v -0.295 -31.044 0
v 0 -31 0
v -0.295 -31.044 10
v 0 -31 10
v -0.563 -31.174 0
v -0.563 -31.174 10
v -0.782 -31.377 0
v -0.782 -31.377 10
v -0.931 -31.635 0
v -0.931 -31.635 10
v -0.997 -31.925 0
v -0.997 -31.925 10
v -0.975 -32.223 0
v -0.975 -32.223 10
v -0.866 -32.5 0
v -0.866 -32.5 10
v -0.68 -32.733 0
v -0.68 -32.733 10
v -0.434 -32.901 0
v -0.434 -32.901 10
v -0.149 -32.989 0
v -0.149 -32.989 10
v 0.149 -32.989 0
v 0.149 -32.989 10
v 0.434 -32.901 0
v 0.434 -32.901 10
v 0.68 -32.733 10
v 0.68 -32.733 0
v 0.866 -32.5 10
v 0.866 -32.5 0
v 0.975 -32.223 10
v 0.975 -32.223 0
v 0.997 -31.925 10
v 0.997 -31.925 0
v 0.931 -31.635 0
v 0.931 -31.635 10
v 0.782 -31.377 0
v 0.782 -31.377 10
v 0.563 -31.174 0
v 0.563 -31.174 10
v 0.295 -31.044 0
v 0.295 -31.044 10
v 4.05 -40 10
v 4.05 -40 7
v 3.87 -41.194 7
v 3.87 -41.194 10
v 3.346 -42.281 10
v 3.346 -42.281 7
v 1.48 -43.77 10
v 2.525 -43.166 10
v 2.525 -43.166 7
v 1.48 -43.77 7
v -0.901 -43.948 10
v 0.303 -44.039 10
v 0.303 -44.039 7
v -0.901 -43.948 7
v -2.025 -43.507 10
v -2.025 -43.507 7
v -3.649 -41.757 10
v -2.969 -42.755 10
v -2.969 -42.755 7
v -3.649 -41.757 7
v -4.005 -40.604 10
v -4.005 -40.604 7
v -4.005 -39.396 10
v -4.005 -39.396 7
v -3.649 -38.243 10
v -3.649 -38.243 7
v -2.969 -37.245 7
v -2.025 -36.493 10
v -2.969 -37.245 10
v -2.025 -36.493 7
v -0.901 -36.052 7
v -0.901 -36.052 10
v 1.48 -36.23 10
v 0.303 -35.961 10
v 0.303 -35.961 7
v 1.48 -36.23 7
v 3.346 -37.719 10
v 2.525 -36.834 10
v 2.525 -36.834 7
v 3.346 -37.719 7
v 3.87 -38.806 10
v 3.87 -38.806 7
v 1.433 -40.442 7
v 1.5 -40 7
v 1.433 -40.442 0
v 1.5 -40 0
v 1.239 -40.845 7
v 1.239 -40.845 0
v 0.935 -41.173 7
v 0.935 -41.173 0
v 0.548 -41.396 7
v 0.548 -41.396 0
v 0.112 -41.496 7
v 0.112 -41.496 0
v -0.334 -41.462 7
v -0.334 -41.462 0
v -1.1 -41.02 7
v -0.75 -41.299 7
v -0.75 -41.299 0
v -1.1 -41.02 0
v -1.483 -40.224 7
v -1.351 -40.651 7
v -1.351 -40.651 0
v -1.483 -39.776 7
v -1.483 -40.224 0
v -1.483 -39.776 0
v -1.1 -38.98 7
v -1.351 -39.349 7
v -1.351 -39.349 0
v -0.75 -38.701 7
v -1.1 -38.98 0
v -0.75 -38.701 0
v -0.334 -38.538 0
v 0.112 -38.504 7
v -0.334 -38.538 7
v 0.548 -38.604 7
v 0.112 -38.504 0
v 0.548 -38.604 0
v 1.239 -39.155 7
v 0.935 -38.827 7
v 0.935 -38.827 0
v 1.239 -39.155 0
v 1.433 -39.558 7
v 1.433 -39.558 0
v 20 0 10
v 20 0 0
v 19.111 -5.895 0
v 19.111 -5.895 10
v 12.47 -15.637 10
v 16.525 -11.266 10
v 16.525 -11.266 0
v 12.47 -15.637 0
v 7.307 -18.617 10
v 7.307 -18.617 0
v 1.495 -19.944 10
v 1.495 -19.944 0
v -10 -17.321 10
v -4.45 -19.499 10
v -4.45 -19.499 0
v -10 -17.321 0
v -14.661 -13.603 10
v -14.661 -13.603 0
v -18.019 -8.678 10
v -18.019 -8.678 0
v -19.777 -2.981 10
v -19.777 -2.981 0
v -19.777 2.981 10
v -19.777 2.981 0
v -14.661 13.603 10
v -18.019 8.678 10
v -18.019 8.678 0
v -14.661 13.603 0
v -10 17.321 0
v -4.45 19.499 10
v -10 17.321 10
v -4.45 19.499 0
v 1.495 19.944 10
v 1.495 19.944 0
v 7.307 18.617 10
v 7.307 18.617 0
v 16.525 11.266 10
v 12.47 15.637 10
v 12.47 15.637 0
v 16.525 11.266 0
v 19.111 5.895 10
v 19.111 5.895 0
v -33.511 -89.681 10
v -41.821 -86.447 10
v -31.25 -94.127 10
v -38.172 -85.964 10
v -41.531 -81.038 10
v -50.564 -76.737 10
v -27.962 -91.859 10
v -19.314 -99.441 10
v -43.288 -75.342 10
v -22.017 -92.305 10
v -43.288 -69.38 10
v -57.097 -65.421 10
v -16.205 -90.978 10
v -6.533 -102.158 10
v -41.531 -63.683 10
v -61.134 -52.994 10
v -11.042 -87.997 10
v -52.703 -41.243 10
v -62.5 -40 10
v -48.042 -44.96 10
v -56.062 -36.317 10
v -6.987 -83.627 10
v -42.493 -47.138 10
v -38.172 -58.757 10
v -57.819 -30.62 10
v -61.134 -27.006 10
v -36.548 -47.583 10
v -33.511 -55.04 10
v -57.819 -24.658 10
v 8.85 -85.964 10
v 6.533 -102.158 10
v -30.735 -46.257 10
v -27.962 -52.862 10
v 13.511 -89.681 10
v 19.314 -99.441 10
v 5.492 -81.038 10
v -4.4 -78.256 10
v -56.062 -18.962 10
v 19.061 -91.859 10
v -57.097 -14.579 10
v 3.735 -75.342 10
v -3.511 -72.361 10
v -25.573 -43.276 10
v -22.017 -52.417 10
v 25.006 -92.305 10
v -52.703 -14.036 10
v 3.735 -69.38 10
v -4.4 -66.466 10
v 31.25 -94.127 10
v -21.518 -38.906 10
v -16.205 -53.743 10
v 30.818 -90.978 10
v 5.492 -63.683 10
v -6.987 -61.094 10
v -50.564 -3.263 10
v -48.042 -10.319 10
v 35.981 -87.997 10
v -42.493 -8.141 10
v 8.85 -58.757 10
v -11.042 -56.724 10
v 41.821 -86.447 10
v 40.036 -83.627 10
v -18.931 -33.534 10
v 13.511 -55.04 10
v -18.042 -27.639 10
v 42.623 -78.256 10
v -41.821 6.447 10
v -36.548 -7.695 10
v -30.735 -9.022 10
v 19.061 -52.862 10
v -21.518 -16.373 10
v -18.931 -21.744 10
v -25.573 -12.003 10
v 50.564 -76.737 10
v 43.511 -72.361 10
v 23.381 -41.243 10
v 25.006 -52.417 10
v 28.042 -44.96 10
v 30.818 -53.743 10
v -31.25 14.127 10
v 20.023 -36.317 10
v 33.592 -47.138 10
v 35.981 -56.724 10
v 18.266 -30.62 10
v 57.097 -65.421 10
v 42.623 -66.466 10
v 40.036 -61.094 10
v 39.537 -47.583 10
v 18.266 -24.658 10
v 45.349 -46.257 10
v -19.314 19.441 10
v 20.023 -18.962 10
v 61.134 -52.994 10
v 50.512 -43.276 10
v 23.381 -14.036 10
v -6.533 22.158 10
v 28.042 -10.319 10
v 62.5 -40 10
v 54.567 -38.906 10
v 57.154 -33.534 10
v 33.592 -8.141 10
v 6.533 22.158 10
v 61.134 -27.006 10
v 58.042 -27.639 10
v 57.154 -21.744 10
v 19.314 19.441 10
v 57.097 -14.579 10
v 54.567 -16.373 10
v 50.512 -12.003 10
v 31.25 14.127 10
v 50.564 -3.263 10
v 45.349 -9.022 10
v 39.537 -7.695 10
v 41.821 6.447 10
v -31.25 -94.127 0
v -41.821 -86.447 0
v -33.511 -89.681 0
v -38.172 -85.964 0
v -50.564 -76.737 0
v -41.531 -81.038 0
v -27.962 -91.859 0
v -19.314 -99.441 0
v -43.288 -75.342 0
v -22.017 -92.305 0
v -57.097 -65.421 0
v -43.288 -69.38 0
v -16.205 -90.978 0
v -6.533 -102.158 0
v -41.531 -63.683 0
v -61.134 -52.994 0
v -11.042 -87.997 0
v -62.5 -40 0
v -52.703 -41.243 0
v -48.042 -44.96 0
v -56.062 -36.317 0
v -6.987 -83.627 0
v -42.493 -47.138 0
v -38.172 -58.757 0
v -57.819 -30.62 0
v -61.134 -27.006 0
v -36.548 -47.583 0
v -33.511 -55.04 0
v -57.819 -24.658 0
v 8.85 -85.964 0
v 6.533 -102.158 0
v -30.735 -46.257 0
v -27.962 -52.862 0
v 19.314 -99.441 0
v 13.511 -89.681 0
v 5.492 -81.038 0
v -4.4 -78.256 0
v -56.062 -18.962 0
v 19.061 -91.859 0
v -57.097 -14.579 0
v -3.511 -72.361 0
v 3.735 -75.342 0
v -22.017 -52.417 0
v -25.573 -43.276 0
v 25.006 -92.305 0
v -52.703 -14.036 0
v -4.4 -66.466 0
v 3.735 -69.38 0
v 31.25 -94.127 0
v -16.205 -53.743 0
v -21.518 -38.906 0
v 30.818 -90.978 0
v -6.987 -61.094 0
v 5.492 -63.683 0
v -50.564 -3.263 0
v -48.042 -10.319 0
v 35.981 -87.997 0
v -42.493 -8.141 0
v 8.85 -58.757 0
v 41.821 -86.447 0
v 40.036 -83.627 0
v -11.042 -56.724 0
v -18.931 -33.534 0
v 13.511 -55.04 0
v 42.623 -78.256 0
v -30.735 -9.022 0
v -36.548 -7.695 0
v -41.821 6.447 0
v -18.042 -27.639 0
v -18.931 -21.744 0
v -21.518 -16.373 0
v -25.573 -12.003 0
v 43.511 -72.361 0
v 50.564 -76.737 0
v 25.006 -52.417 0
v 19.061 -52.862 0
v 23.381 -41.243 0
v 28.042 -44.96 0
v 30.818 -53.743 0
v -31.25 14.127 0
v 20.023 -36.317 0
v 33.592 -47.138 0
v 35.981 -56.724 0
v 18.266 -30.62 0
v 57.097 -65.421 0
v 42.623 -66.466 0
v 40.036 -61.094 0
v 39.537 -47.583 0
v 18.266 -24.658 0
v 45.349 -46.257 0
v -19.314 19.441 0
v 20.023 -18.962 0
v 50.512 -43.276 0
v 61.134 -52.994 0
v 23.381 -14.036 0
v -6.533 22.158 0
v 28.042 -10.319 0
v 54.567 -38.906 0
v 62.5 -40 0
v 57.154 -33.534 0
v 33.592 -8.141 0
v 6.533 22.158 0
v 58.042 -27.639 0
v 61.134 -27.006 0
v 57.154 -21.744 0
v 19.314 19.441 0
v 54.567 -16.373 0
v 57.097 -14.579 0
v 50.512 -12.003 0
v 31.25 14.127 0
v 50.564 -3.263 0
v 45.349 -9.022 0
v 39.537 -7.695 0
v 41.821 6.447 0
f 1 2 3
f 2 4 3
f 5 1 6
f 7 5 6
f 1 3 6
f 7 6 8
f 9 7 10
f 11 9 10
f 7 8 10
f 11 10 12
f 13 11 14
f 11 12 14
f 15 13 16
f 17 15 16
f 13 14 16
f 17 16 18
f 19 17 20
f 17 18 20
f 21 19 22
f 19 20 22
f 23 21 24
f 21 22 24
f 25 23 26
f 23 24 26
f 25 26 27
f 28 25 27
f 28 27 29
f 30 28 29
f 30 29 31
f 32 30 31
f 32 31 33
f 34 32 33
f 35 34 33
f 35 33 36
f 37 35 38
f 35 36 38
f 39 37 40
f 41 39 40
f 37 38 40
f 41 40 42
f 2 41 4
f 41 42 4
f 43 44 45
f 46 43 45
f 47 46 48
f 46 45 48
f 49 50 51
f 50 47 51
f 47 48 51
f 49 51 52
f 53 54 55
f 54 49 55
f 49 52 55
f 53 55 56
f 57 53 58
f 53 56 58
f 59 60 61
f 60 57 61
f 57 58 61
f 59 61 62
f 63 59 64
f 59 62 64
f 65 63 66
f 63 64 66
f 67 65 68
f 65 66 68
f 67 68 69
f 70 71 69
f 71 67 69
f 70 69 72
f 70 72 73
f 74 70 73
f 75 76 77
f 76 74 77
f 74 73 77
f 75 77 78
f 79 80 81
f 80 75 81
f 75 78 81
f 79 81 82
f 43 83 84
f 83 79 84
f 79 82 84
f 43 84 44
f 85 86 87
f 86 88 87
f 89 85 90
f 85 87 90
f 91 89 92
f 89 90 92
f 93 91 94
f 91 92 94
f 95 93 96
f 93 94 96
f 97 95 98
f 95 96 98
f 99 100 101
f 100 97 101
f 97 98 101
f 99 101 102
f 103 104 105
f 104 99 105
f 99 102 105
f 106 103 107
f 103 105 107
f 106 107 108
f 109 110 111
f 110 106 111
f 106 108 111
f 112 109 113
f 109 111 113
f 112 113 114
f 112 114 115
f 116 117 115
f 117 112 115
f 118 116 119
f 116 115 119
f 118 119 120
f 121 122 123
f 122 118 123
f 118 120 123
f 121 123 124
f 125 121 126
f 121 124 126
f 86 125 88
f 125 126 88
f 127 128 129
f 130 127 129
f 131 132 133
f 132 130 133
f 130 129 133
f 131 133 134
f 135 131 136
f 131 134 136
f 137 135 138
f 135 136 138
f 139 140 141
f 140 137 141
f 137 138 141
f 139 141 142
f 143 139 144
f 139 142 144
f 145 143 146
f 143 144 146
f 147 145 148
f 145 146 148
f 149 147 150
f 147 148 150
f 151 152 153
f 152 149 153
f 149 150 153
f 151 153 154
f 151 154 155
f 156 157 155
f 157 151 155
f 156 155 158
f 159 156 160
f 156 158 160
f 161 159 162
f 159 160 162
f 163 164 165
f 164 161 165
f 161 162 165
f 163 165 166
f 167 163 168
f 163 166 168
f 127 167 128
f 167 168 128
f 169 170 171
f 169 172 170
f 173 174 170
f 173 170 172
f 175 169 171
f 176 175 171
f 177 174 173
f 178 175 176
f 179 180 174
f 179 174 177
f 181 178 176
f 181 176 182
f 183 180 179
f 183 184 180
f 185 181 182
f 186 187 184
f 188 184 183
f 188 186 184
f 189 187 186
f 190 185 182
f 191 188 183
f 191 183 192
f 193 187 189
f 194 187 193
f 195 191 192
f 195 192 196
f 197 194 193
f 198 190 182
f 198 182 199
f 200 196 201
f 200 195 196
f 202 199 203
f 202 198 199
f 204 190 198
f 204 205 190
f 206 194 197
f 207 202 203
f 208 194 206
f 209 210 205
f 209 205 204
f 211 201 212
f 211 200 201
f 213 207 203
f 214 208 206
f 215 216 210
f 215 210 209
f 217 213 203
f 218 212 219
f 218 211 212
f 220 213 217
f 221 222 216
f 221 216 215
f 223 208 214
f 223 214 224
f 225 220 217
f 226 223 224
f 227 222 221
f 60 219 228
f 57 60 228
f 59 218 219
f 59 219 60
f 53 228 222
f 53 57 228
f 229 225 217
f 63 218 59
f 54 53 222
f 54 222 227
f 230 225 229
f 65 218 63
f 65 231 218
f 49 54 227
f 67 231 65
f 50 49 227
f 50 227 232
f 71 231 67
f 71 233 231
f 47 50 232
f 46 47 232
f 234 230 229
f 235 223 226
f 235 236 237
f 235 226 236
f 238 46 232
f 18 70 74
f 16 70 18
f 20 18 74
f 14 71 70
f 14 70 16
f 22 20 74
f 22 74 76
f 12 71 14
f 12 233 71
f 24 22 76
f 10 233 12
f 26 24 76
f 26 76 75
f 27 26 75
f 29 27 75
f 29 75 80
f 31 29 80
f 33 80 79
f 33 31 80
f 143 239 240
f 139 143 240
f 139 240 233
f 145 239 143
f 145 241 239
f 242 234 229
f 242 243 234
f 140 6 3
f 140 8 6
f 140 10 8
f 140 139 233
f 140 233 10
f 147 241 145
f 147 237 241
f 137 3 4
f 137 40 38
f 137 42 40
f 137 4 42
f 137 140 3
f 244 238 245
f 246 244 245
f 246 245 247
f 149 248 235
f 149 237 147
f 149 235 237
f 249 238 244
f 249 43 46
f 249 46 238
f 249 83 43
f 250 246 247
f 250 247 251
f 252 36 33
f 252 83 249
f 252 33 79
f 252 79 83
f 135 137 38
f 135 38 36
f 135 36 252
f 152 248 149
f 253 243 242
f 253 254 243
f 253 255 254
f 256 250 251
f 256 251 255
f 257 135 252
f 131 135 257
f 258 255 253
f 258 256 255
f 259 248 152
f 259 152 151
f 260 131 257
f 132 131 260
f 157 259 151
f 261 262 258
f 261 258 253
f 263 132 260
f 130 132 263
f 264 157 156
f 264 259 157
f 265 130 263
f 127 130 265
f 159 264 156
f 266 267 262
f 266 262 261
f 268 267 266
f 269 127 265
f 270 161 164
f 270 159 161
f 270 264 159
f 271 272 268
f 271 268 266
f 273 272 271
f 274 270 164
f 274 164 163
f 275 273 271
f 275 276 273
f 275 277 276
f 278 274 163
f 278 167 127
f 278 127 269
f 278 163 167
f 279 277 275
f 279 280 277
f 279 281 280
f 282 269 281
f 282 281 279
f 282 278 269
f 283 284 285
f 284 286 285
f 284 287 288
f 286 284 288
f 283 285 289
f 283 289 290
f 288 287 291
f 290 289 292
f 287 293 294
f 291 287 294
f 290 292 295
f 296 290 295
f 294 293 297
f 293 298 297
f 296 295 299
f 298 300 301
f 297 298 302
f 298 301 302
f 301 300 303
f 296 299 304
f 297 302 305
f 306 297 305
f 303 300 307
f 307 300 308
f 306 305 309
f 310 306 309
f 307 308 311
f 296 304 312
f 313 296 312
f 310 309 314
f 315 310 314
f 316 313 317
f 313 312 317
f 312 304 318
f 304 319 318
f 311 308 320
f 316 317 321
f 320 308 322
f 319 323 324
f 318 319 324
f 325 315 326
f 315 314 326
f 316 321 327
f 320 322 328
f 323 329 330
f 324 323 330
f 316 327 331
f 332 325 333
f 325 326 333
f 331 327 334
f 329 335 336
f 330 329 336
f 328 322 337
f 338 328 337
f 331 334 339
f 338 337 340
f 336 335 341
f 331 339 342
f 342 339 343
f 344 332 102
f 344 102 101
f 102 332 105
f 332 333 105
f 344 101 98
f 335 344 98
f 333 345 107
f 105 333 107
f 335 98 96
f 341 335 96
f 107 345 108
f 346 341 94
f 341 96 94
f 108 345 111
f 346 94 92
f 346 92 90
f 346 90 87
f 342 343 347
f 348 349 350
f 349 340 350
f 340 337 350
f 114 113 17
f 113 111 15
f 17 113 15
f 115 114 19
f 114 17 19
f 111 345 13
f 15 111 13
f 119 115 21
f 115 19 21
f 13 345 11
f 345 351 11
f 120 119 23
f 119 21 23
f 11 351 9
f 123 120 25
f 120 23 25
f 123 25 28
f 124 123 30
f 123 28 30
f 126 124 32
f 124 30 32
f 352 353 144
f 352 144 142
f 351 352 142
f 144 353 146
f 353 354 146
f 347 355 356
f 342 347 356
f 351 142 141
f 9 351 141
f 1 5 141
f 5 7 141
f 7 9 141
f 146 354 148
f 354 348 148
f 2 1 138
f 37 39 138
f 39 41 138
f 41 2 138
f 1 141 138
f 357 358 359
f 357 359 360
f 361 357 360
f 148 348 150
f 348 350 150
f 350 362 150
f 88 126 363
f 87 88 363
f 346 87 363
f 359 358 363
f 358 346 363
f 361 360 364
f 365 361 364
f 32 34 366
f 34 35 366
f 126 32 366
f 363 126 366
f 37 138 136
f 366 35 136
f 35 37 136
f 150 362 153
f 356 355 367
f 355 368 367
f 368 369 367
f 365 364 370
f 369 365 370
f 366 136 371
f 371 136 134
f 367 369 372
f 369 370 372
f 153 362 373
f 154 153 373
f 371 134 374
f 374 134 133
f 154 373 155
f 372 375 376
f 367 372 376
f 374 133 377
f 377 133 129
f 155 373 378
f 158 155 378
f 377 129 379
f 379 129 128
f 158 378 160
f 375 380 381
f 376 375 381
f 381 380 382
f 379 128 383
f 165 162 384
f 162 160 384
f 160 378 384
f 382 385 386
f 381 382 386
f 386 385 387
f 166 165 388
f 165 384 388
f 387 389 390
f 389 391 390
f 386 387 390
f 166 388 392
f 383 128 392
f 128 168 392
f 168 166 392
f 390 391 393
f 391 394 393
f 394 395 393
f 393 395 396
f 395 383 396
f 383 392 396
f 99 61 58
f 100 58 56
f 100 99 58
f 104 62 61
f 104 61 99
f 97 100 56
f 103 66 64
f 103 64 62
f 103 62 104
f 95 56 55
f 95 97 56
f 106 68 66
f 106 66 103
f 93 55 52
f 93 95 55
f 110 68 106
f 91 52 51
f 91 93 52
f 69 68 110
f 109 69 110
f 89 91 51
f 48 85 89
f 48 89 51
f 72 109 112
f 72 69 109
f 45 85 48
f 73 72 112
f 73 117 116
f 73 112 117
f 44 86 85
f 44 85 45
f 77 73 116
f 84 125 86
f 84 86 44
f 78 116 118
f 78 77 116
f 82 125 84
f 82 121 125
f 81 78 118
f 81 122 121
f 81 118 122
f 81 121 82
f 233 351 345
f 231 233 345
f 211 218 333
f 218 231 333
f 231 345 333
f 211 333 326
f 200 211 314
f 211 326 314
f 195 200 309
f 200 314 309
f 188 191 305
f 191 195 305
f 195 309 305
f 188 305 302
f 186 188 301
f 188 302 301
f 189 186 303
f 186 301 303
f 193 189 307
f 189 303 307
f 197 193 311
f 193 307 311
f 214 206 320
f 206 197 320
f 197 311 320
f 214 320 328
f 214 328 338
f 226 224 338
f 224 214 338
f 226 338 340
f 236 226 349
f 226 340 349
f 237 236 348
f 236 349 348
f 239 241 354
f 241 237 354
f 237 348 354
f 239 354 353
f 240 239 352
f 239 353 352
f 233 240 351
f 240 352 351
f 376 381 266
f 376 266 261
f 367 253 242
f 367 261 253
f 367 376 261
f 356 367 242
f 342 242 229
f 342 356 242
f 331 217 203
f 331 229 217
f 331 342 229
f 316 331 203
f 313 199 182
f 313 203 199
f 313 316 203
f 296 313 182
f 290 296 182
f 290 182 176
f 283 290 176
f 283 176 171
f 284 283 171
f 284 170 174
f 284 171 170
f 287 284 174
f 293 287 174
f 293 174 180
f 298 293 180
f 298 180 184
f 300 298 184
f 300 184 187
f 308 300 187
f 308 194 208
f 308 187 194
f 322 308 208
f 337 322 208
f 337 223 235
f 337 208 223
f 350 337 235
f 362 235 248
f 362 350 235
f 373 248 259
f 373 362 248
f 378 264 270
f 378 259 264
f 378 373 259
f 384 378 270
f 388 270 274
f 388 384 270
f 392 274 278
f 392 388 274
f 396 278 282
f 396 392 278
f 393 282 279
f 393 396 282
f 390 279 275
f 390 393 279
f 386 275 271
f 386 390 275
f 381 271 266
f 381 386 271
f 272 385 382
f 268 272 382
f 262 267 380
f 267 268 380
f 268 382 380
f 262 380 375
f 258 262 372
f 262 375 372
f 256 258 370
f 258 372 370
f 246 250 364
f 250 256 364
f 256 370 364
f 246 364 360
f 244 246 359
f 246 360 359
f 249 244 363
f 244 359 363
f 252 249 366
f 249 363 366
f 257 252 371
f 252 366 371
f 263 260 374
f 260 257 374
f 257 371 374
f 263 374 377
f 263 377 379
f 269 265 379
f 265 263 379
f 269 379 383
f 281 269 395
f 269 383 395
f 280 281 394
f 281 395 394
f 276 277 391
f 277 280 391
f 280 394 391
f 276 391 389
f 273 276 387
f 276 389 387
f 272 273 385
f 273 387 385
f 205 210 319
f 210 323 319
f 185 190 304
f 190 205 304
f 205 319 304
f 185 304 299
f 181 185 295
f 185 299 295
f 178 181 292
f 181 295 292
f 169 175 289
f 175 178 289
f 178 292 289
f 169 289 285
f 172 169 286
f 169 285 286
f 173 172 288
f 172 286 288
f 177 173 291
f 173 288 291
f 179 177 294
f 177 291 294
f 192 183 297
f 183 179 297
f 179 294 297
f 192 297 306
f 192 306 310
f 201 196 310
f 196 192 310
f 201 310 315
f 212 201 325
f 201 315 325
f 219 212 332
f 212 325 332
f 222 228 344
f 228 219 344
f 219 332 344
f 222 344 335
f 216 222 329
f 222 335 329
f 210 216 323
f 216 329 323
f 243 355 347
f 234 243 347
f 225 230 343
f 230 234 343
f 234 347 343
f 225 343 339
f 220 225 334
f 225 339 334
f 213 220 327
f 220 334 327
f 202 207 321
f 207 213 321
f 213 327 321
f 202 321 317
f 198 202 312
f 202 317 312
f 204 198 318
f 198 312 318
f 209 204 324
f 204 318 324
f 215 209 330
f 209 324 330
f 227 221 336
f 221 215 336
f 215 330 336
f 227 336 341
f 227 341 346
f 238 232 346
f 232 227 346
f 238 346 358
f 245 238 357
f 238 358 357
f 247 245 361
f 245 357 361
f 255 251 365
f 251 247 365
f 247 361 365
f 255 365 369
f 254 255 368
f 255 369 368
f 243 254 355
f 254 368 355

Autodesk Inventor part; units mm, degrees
ref_plane "YZ Plane" through (0, 0, 0) normal (1, 0, 0) x (0, 1, 0)
ref_plane "XZ Plane" through (0, 0, 0) normal (0, 1, 0) x (-1, 0, 0)
ref_plane "XY Plane" through (0, 0, 0) normal (0, 0, 1) x (1, 0, 0)
sketch "Sketch1" plane through (0, 0, 0) normal (0, 0, 1) x (1, 0, 0)
  circle A0 centre (0, 0) radius 28 construction
  line L0 (75, -135) -> (-75, -135) construction
  line L1 (-75, -135) -> (-75, 65) construction
  line L2 (-75, 65) -> (75, 65) construction
  line L3 (75, 65) -> (75, -135) construction
  line L4 (75, -135) -> (-75, 65) construction
  line L5 (-75, -135) -> (75, 65) construction
  circle A1 centre (0, 0) radius 20
  circle A2 centre (-38.0423, -27.6393) radius 20
  circle A3 centre (-23.5114, -72.3607) radius 20
  circle A4 centre (23.5114, -72.3607) radius 20
  circle A5 centre (38.0423, -27.6393) radius 20
  circle A6 centre (0, -40) radius 62.5
  circle A7 centre (0, -40) radius 1.5
  circle A8 centre (0, -40) radius 4.05
  circle A9 centre (38.0423, -27.6393) radius 22.5 construction
  circle A10 centre (0, 0) radius 22.5 construction
  circle A11 centre (-38.0423, -27.6393) radius 22.5 construction
  circle A12 centre (-23.5114, -72.3607) radius 22.5 construction
  circle A13 centre (23.5114, -72.3607) radius 22.5 construction
  point P0 (0, -35)
  point P1 (0, -32)
  dimension "d0" = 56
  dimension "d1" = 150
  dimension "d2" = 200
  dimension "d3" = 135
  dimension "d4" = 40
  dimension "d7" = 360
  dimension "d9" = 40
  dimension "d10" = 125
  dimension "d11" = 3
  dimension "d12" = 8.1
  dimension "d17" = 45
  dimension "d20" = 360
  dimension "d22" = 8
extrude "Extrusion1" add sketch "Sketch1" along normal blind 10 contours A6
extrude "Extrusion2" add sketch "Sketch1" along normal blind 7 contours A8
hole "Hole1" at (0, -40, 0) at (0, -32, 0) direction (0, 0, 1) diameter 2 end through all
properties part number "FilterWheel-M40-5pos"
